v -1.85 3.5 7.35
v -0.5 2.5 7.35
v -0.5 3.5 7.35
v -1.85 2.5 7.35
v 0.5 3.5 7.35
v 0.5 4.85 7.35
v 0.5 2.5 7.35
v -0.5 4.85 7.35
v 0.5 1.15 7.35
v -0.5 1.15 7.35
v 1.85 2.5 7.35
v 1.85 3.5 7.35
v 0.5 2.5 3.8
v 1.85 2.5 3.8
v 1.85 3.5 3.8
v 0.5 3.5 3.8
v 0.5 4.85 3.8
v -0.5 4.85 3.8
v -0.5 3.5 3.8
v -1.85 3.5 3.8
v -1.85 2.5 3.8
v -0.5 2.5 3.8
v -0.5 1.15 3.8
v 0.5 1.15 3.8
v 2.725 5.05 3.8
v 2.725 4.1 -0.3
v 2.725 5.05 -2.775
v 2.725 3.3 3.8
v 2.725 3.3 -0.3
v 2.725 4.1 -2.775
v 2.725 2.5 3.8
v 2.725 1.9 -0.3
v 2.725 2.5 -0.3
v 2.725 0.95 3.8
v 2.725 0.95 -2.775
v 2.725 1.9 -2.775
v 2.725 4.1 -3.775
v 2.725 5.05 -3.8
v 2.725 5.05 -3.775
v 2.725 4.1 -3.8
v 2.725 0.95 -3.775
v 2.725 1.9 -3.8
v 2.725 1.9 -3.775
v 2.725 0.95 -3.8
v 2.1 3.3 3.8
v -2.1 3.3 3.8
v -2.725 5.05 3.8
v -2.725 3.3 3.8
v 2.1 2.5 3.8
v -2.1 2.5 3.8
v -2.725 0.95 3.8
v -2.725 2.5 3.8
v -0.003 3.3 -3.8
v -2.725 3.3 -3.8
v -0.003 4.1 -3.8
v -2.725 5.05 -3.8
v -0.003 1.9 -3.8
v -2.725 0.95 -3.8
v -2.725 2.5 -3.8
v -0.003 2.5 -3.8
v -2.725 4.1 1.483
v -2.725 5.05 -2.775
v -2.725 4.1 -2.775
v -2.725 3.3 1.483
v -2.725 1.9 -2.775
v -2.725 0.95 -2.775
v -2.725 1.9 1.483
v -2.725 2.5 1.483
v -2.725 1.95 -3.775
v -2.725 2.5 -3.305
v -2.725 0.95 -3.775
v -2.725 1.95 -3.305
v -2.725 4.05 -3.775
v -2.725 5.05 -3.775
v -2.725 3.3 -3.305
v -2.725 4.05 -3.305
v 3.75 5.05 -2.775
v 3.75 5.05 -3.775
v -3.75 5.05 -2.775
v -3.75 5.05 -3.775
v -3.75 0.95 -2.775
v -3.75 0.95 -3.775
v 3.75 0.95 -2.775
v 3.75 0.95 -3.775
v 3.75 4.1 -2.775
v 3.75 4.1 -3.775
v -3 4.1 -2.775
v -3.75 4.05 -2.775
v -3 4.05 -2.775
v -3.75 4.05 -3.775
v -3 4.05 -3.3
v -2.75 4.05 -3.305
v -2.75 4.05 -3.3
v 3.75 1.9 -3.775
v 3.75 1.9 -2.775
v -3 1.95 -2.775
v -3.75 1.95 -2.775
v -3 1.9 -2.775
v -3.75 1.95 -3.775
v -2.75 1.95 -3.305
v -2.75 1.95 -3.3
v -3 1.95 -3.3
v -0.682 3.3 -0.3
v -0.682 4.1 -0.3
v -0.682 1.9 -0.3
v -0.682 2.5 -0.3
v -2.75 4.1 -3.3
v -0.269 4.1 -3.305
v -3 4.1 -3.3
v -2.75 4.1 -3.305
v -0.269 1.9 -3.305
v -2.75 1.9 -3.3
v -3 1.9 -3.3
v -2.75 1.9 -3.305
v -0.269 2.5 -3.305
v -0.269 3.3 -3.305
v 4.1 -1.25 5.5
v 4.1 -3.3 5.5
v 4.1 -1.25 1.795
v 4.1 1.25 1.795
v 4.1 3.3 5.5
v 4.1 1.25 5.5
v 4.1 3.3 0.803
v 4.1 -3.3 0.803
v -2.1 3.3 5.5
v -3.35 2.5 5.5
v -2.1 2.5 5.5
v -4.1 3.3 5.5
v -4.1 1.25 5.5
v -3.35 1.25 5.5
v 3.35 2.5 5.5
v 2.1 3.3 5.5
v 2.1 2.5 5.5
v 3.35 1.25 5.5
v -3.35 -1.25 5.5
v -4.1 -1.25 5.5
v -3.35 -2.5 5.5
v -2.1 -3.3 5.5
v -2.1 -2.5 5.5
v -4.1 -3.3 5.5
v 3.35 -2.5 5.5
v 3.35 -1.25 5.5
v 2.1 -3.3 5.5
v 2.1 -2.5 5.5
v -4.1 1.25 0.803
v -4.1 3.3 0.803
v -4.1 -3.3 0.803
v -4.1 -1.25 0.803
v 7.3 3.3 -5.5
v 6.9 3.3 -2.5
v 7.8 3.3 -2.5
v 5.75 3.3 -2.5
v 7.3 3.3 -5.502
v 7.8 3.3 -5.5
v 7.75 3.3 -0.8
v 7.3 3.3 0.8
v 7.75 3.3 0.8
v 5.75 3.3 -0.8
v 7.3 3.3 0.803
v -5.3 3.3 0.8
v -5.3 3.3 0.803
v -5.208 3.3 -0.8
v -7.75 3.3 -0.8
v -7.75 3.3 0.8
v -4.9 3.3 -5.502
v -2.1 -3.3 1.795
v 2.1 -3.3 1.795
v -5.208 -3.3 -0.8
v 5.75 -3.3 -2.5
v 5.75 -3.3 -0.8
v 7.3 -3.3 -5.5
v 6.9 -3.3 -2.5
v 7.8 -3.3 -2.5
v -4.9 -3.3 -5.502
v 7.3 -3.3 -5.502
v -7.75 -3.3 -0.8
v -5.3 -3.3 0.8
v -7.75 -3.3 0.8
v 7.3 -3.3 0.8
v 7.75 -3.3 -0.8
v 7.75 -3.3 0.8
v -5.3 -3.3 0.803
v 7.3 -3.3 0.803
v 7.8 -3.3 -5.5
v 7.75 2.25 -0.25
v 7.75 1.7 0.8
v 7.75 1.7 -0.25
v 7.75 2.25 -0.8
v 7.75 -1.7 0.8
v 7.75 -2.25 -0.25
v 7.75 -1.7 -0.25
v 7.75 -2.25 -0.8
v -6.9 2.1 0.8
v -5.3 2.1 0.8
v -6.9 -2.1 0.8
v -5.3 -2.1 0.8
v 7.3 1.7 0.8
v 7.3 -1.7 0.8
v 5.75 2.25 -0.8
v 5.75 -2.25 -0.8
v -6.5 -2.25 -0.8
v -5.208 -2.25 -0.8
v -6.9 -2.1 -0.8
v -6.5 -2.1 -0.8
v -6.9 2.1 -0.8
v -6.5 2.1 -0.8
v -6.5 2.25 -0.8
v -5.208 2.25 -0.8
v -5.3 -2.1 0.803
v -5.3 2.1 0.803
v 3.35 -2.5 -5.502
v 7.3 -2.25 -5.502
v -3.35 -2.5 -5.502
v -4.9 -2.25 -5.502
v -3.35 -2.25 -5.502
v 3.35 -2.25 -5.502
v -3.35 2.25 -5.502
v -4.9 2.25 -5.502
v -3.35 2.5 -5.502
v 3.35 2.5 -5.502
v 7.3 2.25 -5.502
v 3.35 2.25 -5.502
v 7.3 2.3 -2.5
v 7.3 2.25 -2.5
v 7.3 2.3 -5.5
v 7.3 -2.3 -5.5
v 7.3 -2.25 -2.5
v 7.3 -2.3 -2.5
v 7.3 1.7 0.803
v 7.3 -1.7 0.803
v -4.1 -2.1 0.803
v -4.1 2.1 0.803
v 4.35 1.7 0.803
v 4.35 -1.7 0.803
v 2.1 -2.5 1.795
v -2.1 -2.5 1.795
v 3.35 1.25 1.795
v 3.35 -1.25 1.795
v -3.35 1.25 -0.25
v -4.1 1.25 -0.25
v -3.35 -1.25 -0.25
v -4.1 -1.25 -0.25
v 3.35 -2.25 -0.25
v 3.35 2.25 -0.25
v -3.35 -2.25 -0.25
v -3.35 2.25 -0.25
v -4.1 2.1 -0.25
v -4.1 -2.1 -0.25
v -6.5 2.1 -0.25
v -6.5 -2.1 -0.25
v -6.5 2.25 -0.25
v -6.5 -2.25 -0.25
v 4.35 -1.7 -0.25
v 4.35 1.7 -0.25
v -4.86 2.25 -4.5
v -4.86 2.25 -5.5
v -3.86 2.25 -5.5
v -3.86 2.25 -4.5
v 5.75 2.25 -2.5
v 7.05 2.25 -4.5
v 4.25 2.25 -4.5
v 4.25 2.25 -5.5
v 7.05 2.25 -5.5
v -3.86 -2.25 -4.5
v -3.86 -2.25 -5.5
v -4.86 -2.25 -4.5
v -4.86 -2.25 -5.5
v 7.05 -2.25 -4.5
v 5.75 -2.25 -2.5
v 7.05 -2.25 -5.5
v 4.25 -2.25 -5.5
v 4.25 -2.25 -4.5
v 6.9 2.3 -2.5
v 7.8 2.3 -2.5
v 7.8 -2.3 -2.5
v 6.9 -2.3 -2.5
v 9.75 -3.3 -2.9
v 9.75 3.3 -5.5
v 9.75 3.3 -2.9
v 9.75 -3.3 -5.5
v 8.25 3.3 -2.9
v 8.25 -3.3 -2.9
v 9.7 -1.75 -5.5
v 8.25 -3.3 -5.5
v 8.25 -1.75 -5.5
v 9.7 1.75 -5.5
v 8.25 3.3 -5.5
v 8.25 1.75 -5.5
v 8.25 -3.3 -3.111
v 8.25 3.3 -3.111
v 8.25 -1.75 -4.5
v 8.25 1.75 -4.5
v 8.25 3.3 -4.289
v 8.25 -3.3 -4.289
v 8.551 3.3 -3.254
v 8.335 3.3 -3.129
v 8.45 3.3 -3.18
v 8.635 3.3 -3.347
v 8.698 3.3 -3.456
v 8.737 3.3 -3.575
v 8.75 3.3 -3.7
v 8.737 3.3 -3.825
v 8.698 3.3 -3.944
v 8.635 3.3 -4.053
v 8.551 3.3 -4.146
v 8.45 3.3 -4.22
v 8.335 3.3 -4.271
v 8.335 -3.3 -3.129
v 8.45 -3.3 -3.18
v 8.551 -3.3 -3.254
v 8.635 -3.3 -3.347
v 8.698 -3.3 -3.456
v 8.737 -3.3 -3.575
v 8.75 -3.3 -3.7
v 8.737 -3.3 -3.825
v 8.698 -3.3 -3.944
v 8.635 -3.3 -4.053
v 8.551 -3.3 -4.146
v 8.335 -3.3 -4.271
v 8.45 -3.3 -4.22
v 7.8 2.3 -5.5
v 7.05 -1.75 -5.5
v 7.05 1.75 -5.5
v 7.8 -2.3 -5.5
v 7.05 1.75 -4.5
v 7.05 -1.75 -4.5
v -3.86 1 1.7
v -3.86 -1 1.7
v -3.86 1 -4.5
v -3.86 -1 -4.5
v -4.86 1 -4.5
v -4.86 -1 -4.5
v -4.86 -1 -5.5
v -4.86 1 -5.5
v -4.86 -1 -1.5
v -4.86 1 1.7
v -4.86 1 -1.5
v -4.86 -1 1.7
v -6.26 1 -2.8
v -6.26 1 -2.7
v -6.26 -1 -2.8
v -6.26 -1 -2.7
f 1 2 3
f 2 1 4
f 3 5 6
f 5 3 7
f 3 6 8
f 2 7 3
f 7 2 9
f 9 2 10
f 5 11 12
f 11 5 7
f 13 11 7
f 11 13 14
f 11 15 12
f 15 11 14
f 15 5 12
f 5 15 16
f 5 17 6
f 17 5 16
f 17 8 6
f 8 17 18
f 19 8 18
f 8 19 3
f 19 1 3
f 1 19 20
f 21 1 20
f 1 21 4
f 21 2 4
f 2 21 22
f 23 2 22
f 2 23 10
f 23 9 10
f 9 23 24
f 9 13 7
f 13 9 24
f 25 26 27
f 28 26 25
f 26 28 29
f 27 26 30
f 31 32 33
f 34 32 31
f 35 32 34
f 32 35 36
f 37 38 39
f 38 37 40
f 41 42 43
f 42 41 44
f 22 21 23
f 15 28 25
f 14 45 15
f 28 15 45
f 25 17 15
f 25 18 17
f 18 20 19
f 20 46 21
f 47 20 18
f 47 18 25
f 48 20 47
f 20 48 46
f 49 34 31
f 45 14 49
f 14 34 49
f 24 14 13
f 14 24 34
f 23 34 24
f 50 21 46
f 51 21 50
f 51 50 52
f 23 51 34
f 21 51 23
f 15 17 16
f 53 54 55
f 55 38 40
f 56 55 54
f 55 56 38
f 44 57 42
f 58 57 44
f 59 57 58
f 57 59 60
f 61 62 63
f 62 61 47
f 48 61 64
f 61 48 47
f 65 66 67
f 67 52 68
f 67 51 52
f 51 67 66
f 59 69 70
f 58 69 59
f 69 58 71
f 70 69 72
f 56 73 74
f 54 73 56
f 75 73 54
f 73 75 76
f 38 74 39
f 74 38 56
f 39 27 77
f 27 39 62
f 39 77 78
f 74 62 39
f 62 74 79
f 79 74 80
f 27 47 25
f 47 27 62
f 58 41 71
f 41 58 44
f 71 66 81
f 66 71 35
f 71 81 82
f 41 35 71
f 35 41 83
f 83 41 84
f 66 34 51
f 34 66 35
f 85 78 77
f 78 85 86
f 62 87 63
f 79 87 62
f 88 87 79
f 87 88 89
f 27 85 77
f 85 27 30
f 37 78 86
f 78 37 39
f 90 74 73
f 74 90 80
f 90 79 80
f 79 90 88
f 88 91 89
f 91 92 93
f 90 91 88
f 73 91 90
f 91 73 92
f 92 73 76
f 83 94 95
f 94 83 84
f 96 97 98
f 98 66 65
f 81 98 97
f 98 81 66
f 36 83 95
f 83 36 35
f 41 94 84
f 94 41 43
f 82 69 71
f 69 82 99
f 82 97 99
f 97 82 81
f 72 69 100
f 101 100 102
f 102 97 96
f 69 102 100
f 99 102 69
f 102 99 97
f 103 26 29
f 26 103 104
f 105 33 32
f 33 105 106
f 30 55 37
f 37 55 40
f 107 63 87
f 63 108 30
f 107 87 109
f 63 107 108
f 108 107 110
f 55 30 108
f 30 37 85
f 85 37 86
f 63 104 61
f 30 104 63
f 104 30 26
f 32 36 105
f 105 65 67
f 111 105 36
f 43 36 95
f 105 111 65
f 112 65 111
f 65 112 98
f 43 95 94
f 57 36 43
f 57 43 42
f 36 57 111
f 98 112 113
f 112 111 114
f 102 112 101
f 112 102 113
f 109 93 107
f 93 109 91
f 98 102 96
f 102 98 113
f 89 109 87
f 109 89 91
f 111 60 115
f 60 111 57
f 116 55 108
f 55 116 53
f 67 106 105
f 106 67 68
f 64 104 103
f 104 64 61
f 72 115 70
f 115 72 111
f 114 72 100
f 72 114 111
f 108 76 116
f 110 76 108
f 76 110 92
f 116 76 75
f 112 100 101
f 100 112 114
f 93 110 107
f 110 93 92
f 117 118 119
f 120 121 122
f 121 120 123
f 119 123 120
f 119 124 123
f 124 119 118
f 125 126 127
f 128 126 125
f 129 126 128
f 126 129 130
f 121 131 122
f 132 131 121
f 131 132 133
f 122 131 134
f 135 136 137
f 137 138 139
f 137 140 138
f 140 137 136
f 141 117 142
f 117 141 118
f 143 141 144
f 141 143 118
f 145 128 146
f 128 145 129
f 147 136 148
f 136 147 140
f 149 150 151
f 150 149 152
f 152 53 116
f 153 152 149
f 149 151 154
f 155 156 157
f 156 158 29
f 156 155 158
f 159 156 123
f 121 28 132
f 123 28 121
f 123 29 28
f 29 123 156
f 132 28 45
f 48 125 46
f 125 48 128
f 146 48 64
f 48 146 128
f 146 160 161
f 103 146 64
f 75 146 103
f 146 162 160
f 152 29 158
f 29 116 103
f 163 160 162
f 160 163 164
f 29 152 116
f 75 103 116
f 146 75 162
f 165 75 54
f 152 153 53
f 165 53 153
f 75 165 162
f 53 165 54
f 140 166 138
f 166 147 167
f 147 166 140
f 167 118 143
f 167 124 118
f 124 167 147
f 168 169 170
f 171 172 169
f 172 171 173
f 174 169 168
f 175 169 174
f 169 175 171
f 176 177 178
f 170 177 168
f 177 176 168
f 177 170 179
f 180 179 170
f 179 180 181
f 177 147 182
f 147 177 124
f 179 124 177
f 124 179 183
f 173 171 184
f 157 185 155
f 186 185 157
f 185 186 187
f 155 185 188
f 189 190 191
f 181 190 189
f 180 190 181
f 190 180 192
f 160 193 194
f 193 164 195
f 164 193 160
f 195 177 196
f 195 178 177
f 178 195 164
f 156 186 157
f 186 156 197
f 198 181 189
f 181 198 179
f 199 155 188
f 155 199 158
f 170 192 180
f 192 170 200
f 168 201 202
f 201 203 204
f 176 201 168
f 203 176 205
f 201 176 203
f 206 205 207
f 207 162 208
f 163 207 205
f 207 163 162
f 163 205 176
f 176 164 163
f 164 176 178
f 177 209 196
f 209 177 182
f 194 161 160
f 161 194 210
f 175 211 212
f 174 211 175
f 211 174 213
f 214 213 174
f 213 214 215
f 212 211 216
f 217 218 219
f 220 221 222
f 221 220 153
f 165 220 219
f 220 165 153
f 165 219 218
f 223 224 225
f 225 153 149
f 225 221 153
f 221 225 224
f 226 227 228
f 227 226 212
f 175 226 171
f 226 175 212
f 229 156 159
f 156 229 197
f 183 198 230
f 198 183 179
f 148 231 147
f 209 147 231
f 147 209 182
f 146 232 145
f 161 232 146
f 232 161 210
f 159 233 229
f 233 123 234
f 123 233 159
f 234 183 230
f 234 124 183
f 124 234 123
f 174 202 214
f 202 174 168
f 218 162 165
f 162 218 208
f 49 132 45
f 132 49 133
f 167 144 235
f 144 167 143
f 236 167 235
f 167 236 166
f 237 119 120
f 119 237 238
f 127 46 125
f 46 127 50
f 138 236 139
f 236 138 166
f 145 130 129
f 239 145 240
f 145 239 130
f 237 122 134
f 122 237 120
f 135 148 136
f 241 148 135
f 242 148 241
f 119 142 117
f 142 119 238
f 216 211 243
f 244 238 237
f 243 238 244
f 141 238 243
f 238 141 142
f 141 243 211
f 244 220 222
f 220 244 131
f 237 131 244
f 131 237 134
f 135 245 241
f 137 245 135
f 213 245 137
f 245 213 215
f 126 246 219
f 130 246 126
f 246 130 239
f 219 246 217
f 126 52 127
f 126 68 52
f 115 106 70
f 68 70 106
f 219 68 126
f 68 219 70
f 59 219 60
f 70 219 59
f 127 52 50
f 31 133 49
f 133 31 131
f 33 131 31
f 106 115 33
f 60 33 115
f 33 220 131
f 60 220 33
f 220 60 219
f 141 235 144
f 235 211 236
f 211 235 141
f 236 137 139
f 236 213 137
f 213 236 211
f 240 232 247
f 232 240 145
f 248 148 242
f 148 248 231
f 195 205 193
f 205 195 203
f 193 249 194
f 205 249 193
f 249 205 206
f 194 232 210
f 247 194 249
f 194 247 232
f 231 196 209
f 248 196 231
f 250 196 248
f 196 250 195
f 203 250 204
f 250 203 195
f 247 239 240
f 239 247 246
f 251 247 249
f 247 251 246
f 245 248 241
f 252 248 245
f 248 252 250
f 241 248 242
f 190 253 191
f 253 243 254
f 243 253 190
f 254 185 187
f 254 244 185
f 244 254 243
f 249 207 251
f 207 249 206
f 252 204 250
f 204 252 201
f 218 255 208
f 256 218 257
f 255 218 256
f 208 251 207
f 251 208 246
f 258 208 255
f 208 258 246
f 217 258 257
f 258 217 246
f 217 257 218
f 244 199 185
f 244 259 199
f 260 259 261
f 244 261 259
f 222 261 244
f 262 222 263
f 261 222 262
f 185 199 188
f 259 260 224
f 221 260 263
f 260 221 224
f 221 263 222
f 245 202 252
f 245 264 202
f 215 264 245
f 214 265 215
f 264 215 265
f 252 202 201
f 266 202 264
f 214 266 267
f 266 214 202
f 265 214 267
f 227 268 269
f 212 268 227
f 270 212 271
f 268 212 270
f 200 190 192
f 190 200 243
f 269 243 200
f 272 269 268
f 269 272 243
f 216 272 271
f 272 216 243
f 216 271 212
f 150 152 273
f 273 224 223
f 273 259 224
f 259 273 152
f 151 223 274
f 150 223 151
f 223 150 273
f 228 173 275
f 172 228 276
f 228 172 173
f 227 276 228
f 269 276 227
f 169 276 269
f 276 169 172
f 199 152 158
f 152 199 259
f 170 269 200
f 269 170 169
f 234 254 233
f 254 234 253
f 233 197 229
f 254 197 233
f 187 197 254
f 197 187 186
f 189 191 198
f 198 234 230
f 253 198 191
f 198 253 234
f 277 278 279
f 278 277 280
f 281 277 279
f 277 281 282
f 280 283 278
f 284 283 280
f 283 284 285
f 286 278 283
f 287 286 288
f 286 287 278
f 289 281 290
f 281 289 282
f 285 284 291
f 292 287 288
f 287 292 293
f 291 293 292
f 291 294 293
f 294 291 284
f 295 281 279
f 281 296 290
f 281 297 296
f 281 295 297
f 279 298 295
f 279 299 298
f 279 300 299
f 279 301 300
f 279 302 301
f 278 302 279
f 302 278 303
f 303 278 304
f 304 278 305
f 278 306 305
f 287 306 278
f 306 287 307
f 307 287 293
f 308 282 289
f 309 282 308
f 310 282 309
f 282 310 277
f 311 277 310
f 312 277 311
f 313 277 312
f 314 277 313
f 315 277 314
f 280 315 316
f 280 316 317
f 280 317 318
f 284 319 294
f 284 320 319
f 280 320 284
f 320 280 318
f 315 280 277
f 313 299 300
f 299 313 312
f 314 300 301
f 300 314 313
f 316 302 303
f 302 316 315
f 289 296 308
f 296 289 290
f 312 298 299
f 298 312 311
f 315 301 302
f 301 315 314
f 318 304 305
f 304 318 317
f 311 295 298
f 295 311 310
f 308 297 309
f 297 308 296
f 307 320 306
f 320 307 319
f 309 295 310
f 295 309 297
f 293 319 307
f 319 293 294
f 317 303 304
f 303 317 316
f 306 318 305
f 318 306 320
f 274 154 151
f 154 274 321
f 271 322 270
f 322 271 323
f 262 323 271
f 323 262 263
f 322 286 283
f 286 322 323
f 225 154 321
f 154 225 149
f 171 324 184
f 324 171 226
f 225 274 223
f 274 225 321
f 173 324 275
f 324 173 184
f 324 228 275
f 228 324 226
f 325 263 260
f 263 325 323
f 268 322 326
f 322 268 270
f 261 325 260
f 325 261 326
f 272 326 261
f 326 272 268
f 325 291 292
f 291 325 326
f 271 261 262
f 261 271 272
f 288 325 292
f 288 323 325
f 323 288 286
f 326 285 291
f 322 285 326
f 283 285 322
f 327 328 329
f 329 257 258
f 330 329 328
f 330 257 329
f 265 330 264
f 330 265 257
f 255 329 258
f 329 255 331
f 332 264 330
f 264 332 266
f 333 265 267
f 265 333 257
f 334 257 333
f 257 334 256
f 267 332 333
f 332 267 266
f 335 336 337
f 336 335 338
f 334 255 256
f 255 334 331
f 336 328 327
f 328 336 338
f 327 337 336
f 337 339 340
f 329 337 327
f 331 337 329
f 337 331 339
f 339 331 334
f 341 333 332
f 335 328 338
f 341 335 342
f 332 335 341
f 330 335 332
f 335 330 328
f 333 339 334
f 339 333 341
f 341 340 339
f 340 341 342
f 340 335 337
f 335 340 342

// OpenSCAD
$fn=30;
sep=3;

module ooo(r=0.5){
  offset(r)offset(-r*2)offset(r)children();
}

module kostar(){
  module capPart(){
    linear_extrude(3.8)difference(){
      ooo()union(){
        square([7,3.3],center=true);
        translate([0.7,7/2,0])square([1.4,7],center=true);
      }
      square([5,1.3],center=true);
    }

    
    
  }
  module platePart(){
    linear_extrude(3.2)
    difference(){
      ooo(){
        square([14,2.2],center=true);
        translate([14/2-2/2,0,0]){
          square([2,7],center=true);
          translate([1,-7.2/2+2.5/2,0])square([6,2.5],center=true);
          
        }
        
        translate([-14/2+2/2,0,0]){
          square([2,7],center=true);
          translate([-4/4,-7/2+2/2,0])square([4,2],center=true);
        }
      }
      translate([14/2+0.8,-7/2+2.5/2+1,0])square([1.5,2],center=true);
    }
  }
  
  capPart();
  translate([0,-sep,0])rotate([0,0,180])platePart();
}

module sherryPlateMount(){
  module crossPart() {
    w=4.1;
//    #translate([2,0,-0.35])cube([1,1,4.15]);
//    #translate([-3,0,1.5])cube([1,1,2.3]);
    difference(){
      union(){
        translate([0,0,(11.1-3.6)/2])
        linear_extrude(3.6)
        union(){
          square([1, 3.7],center=true);
          square([3.7,1],center=true);
        }
        cube([5.45,w,7.6],center=true);
        
        translate([0,w/2-1/2,-11.1/4-1/2])
          cube([7.5,1,1],center=true);
        translate([0,-w/2+1/2,-11.1/4-1/2])
          cube([7.5,1,1],center=true);
      }
      translate([2,0,-10/2+2.2])cube([4,2.2,5],center=true);
      translate([0,0,-10/2+3.2])cube([6,2.2,3],center=true);
      hull(){
        translate([-2.8,0,1.5])cube([0.1,2.2,0.01],center=true);
        translate([5.5/4,0,-3.8])cube([5.5/2,2.2,0.01],center=true);
      }
      hull(){
        translate([-2.8,0,1.5])cube([0.1,2.2,0.01],center=true);
        translate([0,0,-3.3])cube([5.5,2.2,0.01],center=true);
      }
    }
  }
  w=6.6;
  lt=8.2;
  lb=12.6;
  
  sliderCutW=5;
  sliderCutL=6.7;
  
//  wireSize=1.6;
  wireSize=1.1;
  
  module mountPart() {
    module wireHolder(){
      translate([(3.2-wireSize)/2,0,0])cube([2-wireSize,1,3],center=true);
    }
    difference(){
      union(){
        cube([lt,w,11],center=true);
        cube([15.5,w,1.6],center=true);
//        translate([1,0,-(6.2/2.58)])
        translate([1,0,-11/4.59])
          hull(){
            translate([0,0,6.2/2])cube([lb,w,0.2],center=true);
            translate([0.2,0,-6.2/2])cube([lb-0.4,w,0.01],center=true);
          }
      }
      
      
      union(){// sliderhole
        cube([sliderCutL,sliderCutW,12],center=true);
        translate([0,0,(11-3.7)/2]){
          cube([4.2,sliderCutL+1,3.71],center=true);
          cube([sliderCutW+4,2.5,3.71],center=true);
        }
      }
      
      
      // Bottom cut
      translate([1,0,-3])
        cube([15,4.5,11/2],center=true);
      
      // Backcut
      translate([-11/2,0,0]){
        cube([2.8,4.2,11],center=true);
        translate([3/2,0,0])
          cube([3,2.5,5],center=true);
      }
      
    
      // Front hook cut
      translate([15/2-(3-2.5)/2,0,-1.65])
        cube([3,7,1.7],center=true);
//      #translate([15/2-1.7/2,0,-1.65])
//        cube([1.7,7,1.7],center=true);
    
      // Front top cut
      translate([lb/2,0,0])
        cube([3.9,3.4,1.7],center=true);
    }
    
    
    translate([0,0,-11/2+1/2]){
      
      union(){// Front stab holder
        translate([5.65,0,0])
          cube([2.8,6,1],center=true);
        
        translate([7,0,0])
          cube([5.4,3.5,1],center=true);
        
        translate([9,0,0.8])difference(){
          cube([1.5,w,2.6],center=true);
          translate([-1.7/2,0,0.5])
            rotate([90,0,0])
              cylinder(d=wireSize+0.1,h=7,center=true);
        }
        
        // Extra wire holder
        translate([lb/2,0,1]){
          
          translate([0,w/2-1/2,0])wireHolder();
          translate([0,-w/2+1/2,0])wireHolder();
        }
        
        
      }
    
      
      
      
      // Peg part
      translate([-lb/2.89,0,0]){
        cube([1,w,1],center=true);
        translate([0,0,7.2/2-1/2])cube([1,2,7.2],center=true);
        
        peg=1.9;
        hull(){
          translate([0,0,3/2])cube([1,2,4],center=true);
          translate([-peg/2,0,4.5/2])cube([peg,2,0.1],center=true);
        }
      }
    }
    
//    translate([16/2,0,-3.5])
//    rotate([90,0,0]){
//      translate([0,0,w/2])cylinder(d=1.6,h=2,center=true);
//      translate([0,0,-w/2])cylinder(d=1.1,h=2,center=true);
//    }
  }
  
  translate([0,sep,0])crossPart();
  mountPart();
}

//kostar();
sherryPlateMount();
